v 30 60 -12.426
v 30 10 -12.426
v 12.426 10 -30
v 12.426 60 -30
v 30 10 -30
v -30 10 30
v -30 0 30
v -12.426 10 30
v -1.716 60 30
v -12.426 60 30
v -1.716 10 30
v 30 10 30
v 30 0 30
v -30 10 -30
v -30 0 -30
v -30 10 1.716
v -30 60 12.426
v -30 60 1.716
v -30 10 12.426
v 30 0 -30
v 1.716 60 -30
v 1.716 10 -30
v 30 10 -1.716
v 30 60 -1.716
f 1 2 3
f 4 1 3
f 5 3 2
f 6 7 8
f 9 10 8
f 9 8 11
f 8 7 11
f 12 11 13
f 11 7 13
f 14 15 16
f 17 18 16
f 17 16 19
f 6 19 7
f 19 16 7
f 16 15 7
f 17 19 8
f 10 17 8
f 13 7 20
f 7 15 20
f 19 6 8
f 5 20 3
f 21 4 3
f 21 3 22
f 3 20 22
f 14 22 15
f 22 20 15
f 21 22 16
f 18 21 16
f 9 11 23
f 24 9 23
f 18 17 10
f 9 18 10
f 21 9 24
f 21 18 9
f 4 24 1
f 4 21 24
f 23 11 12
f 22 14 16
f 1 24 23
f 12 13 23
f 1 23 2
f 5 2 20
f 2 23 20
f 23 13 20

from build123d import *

# Parameters (mm, degrees)
BOSS_EXTRUDE1_DEPTH = 60
BOSS_EXTRUDE2_DEPTH = 10


with BuildPart() as part:
    # Sketch1 → Boss-Extrude1 (new body)
    with BuildSketch(Plane(origin=(0, 0, 0), x_dir=(1, 0, 0), z_dir=(0, 1, 0))):
        Polygon((-30, -12.426406871), (-12.426406871, -30), (-1.715728753, -30), (30, 1.715728753), (30, 12.426406871), (12.426406871, 30), (1.715728753, 30), (-30, -1.715728753), align=None)
    extrude(amount=BOSS_EXTRUDE1_DEPTH)

    # Sketch1_3 → Boss-Extrude2 (add)
    with BuildSketch(Plane(origin=(0, 0, 0), x_dir=(1, 0, 0), z_dir=(0, 1, 0))):
        Polygon((-30, -12.426406871), (-30, -30), (-12.426406871, -30), align=None)
        Polygon((30, 1.715728753), (-1.715728753, -30), (30, -30), align=None)
        Polygon((12.426406871, 30), (30, 12.426406871), (30, 30), align=None)
        Polygon((-30, 30), (-30, -1.715728753), (1.715728753, 30), align=None)
    extrude(amount=BOSS_EXTRUDE2_DEPTH)


solid = part.part
